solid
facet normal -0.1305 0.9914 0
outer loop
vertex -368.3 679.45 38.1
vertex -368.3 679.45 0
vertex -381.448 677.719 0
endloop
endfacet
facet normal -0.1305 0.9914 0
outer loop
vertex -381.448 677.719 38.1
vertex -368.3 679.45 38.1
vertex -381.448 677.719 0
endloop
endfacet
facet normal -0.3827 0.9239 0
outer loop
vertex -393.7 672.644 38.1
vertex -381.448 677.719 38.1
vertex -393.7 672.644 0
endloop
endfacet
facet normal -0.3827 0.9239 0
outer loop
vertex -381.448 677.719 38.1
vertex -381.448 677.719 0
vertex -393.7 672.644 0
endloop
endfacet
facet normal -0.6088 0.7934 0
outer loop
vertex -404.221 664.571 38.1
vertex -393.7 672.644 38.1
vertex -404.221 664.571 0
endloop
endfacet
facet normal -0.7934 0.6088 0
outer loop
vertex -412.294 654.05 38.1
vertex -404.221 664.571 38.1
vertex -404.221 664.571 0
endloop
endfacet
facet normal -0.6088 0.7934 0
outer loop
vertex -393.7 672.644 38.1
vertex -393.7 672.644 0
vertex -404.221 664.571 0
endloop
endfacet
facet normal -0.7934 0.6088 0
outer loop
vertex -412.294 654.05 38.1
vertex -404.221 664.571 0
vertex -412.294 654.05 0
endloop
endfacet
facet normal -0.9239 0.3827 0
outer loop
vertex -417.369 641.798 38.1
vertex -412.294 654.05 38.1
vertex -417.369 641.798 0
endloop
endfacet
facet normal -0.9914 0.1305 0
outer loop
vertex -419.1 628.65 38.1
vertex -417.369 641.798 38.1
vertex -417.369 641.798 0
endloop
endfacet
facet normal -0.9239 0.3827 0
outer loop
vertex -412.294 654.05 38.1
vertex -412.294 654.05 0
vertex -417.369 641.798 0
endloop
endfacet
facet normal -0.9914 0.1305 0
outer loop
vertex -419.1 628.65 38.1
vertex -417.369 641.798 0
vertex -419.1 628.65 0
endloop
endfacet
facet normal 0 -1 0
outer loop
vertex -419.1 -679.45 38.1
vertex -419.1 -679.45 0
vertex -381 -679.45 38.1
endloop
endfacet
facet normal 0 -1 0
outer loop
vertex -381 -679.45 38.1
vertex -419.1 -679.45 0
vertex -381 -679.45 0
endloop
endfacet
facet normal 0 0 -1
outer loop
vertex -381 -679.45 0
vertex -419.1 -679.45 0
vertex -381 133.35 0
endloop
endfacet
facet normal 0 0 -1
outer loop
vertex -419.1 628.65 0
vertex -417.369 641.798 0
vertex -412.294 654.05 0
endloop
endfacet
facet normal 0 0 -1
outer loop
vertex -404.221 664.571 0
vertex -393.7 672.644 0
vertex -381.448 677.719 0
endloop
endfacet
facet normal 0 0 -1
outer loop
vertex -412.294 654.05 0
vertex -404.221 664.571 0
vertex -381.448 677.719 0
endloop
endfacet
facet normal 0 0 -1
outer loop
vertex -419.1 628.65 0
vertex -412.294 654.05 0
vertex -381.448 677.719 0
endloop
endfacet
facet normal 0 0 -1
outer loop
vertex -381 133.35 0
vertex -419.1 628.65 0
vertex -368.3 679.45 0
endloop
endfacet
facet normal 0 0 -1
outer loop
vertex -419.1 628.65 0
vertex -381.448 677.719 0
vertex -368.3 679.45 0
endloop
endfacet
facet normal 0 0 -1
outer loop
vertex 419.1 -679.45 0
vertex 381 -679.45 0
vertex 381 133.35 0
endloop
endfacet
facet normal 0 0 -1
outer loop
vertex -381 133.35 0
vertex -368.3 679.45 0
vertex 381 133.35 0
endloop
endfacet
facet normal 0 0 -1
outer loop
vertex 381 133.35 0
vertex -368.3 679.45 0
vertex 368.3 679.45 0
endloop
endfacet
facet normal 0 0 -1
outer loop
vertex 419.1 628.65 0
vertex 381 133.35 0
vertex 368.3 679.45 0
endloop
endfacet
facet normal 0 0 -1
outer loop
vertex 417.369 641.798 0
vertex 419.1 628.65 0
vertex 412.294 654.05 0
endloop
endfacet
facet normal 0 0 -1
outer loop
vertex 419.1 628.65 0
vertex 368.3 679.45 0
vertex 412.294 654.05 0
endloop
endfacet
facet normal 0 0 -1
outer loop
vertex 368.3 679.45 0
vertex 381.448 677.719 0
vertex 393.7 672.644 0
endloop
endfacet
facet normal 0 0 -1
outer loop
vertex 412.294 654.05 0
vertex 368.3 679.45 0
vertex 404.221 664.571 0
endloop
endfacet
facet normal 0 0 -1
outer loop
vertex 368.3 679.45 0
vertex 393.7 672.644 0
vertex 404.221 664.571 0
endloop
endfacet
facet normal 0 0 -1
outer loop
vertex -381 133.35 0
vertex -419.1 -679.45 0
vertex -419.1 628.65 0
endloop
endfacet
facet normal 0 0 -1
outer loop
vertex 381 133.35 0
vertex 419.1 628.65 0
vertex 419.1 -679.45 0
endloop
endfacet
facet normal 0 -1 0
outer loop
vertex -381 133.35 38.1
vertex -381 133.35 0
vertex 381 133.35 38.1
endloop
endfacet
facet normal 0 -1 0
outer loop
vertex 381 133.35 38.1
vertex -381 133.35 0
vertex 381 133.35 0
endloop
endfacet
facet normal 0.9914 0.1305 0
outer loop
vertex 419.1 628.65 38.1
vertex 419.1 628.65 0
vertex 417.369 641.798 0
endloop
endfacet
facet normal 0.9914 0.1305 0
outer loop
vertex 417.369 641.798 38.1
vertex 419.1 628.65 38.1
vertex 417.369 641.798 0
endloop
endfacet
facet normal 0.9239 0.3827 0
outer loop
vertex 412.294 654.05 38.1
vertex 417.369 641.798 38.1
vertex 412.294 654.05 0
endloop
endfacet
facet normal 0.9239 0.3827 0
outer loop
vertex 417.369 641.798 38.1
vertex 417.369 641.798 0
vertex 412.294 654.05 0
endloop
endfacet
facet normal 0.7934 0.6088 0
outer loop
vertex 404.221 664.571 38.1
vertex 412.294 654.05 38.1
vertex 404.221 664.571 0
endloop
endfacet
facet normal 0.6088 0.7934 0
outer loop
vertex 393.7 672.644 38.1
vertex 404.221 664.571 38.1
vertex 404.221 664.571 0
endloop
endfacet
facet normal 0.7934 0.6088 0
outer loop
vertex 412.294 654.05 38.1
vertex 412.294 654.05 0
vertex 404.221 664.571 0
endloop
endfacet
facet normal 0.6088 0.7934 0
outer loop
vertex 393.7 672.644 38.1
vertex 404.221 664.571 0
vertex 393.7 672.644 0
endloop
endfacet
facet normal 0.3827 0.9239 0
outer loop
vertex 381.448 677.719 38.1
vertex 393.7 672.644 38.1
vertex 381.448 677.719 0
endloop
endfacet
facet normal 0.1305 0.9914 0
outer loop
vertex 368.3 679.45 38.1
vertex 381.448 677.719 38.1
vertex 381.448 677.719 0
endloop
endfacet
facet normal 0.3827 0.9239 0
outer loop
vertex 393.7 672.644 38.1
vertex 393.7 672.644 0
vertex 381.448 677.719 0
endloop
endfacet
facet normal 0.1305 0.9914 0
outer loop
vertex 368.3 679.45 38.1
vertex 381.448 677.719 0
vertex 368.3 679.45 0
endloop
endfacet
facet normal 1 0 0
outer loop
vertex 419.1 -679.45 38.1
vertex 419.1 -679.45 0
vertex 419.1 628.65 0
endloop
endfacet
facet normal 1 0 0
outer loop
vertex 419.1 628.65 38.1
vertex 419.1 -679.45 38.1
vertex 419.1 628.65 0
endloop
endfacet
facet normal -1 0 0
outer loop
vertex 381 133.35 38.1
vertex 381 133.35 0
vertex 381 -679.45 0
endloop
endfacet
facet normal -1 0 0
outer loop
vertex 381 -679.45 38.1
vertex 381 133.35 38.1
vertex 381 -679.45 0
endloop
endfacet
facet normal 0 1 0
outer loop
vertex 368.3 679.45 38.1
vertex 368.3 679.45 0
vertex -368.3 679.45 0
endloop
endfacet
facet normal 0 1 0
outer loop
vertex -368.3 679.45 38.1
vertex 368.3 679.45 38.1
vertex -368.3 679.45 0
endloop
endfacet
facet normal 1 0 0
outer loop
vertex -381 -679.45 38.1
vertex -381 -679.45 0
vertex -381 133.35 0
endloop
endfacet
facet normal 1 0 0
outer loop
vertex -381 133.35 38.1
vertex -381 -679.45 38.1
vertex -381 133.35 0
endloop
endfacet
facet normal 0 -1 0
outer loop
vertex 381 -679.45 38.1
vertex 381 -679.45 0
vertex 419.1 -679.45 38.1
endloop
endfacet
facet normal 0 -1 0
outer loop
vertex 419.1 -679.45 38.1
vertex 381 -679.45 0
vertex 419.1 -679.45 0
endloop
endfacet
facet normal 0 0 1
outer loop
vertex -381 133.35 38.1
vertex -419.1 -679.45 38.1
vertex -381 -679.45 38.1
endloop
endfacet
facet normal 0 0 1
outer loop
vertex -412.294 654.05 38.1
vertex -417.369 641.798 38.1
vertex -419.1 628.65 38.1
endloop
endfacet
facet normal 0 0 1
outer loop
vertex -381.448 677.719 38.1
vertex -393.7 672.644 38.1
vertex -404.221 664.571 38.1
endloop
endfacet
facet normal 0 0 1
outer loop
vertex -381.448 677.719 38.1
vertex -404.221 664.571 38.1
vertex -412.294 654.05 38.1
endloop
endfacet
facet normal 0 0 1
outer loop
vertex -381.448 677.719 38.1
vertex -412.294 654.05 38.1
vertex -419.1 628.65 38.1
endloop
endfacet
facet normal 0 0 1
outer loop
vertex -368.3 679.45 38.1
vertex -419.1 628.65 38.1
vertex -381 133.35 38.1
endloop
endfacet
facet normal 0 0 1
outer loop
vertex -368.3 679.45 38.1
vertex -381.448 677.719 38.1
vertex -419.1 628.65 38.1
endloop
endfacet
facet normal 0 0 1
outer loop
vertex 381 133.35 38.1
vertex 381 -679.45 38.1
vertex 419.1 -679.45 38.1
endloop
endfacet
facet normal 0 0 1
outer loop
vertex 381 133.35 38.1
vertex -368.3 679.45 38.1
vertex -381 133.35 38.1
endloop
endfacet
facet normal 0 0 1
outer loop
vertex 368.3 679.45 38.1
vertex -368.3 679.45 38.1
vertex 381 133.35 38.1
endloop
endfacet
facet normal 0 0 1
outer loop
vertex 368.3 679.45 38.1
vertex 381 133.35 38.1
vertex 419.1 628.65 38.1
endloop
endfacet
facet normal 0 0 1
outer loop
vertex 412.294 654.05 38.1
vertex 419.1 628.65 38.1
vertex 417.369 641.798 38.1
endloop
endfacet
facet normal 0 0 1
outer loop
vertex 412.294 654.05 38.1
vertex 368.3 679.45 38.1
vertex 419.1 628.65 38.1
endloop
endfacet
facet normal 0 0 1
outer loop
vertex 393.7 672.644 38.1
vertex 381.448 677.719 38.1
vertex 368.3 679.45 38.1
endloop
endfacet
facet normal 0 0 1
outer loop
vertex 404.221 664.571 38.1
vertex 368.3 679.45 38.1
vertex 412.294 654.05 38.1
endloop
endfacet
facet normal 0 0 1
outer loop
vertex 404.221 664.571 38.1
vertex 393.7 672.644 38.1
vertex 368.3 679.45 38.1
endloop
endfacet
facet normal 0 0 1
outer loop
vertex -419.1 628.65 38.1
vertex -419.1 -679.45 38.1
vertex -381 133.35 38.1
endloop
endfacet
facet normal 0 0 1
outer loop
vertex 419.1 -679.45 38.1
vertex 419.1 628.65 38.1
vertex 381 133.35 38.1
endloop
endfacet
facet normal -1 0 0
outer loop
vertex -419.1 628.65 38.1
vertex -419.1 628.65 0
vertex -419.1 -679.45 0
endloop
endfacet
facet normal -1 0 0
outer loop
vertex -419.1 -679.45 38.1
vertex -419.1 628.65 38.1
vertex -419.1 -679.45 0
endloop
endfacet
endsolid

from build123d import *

# Parameters (mm, degrees)
F1_DEPTH = 38.1


with BuildPart() as f1:
    # F0 (on Top) → F1 (new body)
    with BuildSketch(Plane.XY):
        with BuildLine():
            Line((368.3, 679.45), (-368.3, 679.45))
            ThreePointArc((-368.3, 679.45), (-404.221024, 664.571024), (-419.1, 628.65))
            Line((-419.1, 628.65), (-419.1, -679.45))
            Line((-419.1, -679.45), (-381, -679.45))
            Line((-381, -679.45), (-381, 133.35))
            Line((-381, 133.35), (381, 133.35))
            Line((381, 133.35), (381, -679.45))
            Line((381, -679.45), (419.1, -679.45))
            Line((419.1, -679.45), (419.1, 628.65))
            ThreePointArc((419.1, 628.65), (404.221024, 664.571024), (368.3, 679.45))
        make_face()
    extrude(amount=F1_DEPTH)


solid = f1.part
